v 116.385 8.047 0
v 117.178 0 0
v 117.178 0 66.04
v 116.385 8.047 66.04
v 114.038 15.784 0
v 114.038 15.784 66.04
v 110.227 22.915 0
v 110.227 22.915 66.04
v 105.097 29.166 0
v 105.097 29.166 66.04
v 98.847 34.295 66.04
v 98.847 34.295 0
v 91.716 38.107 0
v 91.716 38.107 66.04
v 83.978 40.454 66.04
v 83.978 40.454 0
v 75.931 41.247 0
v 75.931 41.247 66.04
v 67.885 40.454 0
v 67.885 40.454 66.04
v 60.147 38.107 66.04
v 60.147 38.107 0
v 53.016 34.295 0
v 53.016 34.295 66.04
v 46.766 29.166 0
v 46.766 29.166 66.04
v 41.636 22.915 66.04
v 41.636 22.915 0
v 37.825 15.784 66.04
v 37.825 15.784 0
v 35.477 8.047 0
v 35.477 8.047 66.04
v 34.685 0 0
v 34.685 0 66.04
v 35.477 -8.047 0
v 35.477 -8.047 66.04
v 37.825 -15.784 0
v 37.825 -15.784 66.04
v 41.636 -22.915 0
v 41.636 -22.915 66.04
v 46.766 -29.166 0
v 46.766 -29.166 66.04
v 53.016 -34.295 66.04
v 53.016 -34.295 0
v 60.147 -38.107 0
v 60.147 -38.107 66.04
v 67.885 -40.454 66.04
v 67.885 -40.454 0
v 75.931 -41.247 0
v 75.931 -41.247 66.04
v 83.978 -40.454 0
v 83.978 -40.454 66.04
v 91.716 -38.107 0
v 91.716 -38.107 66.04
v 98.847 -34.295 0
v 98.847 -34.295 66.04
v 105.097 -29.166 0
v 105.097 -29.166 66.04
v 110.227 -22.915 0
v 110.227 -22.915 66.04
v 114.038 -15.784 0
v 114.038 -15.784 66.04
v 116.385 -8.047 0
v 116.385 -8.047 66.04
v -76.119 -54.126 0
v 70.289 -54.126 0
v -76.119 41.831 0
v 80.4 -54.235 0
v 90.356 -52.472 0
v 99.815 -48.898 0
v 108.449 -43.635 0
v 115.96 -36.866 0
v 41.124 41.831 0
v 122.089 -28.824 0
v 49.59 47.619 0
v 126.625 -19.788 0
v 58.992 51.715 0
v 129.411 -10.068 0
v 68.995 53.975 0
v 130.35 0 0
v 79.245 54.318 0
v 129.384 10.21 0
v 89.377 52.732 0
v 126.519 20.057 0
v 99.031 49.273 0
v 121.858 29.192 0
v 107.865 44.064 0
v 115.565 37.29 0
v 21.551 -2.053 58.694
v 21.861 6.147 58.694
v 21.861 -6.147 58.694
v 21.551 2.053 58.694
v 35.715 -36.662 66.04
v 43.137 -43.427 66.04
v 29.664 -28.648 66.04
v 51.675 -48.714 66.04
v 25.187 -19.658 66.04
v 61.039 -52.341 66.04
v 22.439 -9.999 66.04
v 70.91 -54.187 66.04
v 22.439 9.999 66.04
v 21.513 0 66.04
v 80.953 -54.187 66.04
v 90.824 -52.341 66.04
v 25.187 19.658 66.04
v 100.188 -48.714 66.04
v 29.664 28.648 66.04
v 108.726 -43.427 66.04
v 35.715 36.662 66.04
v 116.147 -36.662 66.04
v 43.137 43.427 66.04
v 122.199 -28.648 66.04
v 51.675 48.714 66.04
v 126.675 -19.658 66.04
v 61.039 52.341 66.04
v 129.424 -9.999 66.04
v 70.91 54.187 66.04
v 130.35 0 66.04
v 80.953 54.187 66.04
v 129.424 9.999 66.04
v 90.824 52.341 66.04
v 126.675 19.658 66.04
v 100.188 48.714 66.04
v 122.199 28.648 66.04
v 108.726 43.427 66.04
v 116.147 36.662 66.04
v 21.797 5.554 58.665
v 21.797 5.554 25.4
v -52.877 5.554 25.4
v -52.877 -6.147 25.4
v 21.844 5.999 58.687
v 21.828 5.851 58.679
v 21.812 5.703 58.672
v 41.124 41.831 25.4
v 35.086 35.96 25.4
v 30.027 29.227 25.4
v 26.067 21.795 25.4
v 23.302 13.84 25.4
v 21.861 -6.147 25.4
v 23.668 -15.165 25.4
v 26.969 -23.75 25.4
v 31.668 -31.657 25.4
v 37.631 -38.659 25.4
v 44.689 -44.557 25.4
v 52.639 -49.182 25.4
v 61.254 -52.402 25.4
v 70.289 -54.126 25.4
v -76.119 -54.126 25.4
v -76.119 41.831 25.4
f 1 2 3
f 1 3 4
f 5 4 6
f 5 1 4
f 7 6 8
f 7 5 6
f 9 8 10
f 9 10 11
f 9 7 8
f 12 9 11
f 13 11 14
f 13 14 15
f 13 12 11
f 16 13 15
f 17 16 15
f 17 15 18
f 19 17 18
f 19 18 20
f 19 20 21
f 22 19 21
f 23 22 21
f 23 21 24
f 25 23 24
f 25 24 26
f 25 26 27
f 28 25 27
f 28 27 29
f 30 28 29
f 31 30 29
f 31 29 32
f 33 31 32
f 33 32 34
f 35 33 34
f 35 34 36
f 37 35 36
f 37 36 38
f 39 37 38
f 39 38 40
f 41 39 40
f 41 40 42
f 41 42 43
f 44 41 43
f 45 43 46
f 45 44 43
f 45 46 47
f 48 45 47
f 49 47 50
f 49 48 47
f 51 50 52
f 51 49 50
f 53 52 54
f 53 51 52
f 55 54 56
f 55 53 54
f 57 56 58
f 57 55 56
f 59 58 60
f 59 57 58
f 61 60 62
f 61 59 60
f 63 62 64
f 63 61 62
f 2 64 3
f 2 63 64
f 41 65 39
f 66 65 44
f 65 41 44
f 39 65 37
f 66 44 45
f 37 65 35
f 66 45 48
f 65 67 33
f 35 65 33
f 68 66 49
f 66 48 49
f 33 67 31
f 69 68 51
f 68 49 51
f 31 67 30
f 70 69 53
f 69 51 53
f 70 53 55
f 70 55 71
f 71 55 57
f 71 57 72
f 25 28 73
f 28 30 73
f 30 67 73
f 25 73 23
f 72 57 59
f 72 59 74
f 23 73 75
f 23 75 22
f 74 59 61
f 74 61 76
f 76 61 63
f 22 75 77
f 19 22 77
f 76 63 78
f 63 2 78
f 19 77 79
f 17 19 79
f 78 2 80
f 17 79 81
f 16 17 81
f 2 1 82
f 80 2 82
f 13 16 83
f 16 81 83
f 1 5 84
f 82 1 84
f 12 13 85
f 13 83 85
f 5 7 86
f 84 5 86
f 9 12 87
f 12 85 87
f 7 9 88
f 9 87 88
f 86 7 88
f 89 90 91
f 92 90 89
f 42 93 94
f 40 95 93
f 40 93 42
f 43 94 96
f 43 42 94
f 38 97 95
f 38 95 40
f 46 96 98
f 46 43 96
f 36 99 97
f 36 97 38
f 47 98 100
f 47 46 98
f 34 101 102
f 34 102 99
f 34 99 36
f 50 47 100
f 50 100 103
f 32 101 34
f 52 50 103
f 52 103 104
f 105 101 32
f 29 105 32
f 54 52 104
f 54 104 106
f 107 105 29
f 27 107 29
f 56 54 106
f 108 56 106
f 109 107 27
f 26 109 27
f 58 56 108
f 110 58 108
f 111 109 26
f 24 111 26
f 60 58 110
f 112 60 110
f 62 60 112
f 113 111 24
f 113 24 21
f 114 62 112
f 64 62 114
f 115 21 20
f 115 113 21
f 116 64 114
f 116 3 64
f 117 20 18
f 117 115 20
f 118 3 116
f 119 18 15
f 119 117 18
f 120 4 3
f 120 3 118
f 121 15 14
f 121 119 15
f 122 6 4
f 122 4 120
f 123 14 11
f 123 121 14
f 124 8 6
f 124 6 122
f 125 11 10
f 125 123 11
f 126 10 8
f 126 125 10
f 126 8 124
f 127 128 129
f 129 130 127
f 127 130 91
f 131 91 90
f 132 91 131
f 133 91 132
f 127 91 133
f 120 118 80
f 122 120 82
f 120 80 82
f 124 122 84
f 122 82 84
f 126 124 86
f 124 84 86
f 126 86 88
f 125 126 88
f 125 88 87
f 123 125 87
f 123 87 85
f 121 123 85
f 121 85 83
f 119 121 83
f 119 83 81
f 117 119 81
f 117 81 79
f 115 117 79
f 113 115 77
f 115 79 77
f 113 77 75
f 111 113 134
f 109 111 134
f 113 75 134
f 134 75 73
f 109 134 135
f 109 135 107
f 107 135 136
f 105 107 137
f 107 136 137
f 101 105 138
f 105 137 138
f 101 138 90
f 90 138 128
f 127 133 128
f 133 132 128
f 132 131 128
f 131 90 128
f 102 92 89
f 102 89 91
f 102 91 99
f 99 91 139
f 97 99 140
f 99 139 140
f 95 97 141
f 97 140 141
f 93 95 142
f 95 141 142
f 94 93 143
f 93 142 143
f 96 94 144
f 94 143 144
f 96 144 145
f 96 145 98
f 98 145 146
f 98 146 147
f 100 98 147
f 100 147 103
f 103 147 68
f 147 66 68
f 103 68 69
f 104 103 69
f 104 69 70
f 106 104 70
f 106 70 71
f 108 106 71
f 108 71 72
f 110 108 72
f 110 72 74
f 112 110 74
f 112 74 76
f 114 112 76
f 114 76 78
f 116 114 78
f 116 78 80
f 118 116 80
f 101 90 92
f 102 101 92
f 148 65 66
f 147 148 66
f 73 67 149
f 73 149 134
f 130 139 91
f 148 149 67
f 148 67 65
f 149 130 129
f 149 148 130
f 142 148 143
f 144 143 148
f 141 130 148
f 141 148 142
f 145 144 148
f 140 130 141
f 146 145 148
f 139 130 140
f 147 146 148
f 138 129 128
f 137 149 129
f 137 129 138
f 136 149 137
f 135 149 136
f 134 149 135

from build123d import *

# Parameters (mm, degrees)
F0_R     = 54.4188392039
F0_R_2   = 41.2465801868
F1_DEPTH = 66.04
F2_W     = 151.658192277
F2_H     = 95.9565676749
F3_DEPTH = 25.4
F4_DEPTH = 50.8
F5_W     = 11.7014325224
F5_H     = 33.2940161884
F6_DEPTH = 101.6
F8_DEPTH = 25.4


with BuildPart() as f1:
    # F0 (on Top) → F1 (new body)
    with BuildSketch(Plane.XY):
        with Locations((75.9313777089, 0)):
            Circle(F0_R)
        with Locations((75.9313777089, 0)):
            Circle(F0_R_2, mode=Mode.SUBTRACT)
    extrude(amount=F1_DEPTH)

    # F2 (on Top) → F3 (join)
    with BuildSketch(Plane.XY):
        with Locations((-0.2903938293, -6.1472672969)):
            Rectangle(F2_W, F2_H)
    extrude(amount=F3_DEPTH)

    # F4 (cut): a face of the model
    f4_faces = [f1.faces().sort_by_distance(p)[0] for p in [
        (58.2134002608, 0, 25.4),
    ]]
    extrude(f4_faces, amount=-F4_DEPTH, mode=Mode.SUBTRACT)

    # F5 (on face) → F6 (join)
    with BuildSketch(Plane(origin=(-76.1194899678, 0, 0), x_dir=(0, -1, 0), z_dir=(-1, 0, 0))):
        with Locations((0.2965510357, 42.0470080942)):
            Rectangle(F5_W, F5_H)
    extrude(amount=-F6_DEPTH)

    # F7 (on face) → F8 (cut)
    with BuildSketch(Plane.XZ.offset(6.1472672969)):
        Polygon((-76.1194899678, 25.4), (-52.8771914542, 25.4), (21.8608574129, 58.6940161884), (-76.1194899678, 58.6940161884), align=None)
    extrude(amount=-F8_DEPTH, mode=Mode.SUBTRACT)


solid = f1.part
